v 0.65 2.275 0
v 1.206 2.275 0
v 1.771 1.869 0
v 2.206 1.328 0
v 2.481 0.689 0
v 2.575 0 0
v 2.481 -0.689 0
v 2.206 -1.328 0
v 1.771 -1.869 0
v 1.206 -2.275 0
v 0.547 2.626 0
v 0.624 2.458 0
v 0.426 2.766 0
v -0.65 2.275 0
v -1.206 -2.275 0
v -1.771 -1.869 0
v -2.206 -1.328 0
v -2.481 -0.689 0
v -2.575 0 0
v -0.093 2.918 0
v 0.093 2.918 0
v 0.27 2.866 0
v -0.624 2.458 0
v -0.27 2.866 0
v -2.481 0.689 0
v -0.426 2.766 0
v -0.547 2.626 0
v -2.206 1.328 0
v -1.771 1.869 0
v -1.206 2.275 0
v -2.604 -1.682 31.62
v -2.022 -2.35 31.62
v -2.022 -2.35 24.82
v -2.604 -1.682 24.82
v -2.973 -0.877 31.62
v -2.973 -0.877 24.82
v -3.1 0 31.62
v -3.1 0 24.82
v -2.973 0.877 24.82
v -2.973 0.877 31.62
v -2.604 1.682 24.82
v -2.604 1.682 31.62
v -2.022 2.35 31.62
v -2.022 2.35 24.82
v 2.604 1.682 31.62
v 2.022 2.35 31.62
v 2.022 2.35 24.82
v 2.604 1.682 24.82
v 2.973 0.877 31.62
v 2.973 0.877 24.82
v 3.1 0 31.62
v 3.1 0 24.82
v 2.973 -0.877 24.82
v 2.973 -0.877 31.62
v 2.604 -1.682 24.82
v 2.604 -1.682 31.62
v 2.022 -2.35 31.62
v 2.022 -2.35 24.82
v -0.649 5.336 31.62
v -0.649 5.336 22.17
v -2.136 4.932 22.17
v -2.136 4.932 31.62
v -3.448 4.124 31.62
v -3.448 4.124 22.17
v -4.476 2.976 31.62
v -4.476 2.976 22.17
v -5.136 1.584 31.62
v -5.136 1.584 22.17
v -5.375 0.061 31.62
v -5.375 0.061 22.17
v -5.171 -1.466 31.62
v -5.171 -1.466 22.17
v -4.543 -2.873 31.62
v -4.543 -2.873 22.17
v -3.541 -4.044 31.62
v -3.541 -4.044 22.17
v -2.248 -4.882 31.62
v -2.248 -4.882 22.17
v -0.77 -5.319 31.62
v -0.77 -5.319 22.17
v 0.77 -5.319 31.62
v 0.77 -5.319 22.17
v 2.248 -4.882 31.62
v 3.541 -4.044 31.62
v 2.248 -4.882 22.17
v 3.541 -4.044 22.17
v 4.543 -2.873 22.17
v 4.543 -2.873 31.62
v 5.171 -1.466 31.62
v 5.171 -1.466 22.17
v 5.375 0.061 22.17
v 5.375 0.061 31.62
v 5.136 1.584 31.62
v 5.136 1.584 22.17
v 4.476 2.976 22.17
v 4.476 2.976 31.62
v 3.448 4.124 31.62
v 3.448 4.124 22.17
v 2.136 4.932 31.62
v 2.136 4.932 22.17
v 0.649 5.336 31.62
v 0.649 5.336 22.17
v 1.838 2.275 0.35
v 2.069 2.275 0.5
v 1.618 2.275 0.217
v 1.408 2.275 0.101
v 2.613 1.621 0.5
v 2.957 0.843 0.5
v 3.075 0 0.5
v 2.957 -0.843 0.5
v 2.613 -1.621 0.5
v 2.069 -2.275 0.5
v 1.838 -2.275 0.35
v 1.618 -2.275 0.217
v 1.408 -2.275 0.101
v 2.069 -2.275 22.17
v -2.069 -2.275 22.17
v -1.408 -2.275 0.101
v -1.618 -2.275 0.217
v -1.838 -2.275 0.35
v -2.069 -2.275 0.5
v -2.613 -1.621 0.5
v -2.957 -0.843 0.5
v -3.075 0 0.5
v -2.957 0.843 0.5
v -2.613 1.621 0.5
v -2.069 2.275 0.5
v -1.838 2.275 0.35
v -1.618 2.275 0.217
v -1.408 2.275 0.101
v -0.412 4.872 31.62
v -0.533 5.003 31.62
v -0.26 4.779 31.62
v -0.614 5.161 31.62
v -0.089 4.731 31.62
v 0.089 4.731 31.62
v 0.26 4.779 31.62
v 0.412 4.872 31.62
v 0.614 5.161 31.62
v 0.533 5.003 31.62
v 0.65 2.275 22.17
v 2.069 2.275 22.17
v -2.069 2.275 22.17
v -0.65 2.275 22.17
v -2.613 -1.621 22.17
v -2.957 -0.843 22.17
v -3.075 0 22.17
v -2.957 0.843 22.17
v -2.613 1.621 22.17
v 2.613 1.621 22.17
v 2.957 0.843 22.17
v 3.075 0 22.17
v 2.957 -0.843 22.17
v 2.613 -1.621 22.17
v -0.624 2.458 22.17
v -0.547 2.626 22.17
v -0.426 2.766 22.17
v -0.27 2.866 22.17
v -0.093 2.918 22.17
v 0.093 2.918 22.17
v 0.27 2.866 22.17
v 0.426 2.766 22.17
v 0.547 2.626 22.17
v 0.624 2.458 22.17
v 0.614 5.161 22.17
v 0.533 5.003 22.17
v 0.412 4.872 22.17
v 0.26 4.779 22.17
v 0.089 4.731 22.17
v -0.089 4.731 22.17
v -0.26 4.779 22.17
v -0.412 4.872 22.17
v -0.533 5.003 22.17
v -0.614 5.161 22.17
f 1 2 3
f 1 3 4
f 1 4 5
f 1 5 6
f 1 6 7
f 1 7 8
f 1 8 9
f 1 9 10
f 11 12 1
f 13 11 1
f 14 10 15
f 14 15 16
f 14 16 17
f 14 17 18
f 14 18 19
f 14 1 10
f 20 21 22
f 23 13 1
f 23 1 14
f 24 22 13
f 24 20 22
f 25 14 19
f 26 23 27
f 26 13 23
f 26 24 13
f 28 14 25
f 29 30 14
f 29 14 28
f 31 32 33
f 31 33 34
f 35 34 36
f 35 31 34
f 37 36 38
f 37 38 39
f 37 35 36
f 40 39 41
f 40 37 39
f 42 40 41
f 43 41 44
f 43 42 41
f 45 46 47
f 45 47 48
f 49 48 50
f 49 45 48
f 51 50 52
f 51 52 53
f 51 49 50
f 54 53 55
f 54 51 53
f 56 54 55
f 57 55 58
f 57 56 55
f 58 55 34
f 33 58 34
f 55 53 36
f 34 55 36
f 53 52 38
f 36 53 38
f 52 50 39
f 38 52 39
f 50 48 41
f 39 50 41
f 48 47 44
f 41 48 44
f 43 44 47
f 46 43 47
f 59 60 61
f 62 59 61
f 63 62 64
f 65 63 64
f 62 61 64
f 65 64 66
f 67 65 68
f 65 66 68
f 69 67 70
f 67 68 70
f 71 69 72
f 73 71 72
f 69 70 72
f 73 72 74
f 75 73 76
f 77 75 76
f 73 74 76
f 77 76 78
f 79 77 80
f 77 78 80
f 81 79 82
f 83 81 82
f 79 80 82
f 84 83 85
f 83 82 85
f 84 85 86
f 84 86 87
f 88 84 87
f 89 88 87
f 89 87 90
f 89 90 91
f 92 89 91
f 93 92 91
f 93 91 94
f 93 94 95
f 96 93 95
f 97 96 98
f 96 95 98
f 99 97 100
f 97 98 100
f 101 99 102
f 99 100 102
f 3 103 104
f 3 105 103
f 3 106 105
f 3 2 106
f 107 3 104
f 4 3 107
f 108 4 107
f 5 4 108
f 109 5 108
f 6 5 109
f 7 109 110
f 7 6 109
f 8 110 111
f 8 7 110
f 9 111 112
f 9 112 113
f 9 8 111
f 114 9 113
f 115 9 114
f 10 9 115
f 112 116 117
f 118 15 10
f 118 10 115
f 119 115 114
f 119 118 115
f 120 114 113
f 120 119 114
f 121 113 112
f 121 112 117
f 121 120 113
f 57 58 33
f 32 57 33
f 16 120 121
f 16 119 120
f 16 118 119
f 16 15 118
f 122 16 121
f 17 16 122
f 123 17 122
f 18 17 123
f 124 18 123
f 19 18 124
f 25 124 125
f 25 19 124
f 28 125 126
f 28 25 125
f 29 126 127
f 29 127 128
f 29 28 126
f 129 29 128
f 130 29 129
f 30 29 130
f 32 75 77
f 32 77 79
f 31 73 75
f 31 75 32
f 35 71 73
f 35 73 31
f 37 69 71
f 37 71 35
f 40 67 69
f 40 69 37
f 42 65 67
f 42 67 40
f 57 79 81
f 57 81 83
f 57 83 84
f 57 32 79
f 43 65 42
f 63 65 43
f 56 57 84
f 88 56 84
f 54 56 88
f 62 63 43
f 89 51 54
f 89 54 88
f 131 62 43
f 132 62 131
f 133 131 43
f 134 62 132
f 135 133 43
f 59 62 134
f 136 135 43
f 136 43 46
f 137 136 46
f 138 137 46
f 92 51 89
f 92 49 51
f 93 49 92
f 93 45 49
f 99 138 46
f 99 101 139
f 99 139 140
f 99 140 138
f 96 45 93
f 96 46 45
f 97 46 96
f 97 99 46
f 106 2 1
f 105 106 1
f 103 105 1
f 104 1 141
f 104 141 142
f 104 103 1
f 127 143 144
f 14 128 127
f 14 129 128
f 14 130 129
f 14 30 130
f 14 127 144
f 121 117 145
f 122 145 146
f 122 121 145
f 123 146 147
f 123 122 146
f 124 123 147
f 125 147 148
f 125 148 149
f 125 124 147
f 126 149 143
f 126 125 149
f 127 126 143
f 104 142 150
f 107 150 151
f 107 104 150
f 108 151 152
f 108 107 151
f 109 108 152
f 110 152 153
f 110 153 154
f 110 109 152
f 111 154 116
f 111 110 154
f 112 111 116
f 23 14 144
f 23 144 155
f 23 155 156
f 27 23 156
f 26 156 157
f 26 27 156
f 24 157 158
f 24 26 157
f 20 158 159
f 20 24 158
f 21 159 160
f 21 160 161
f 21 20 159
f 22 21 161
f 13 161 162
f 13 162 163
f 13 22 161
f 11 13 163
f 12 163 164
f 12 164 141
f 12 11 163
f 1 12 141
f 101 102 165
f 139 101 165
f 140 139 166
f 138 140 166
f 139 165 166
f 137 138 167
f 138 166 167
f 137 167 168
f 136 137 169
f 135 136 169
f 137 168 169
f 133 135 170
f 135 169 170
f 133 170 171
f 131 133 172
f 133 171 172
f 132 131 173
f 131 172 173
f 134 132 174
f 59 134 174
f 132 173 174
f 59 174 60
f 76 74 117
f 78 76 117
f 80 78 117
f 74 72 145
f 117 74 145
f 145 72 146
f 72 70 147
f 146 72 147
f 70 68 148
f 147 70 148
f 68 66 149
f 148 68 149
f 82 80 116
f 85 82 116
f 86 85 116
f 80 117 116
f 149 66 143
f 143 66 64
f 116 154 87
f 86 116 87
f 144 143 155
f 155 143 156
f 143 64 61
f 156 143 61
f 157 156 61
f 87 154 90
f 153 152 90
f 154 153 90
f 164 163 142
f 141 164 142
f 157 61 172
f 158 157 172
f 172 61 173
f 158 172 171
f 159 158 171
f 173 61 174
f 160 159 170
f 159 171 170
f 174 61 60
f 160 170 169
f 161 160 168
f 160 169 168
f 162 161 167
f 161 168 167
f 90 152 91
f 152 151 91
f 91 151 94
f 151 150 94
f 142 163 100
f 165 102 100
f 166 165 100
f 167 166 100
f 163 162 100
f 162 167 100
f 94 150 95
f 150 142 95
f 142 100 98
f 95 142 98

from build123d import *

# Parameters (mm, degrees)
BOSS_EXTRUDE1_DEPTH = 22.17
BOSS_EXTRUDE2_DEPTH = 9.45
CUT_EXTRUDE1_DEPTH  = 6.8
CHAMFER1_SIZE       = 0.5


with BuildPart() as part:
    # Sketch1 → Boss-Extrude1 (new body)
    with BuildSketch(Plane.XY):
        with BuildLine():
            Line((0.65, 2.275), (2.068816087, 2.275))
            ThreePointArc((2.068816087, 2.275), (3.075, 0), (2.068816087, -2.275))
            Line((2.068816087, -2.275), (-2.068816087, -2.275))
            ThreePointArc((-2.068816087, -2.275), (-3.075, 0), (-2.068816087, 2.275))
            Line((-2.068816087, 2.275), (-0.65, 2.275))
            ThreePointArc((-0.65, 2.275), (0, 2.925), (0.65, 2.275))
        make_face()
    extrude(amount=BOSS_EXTRUDE1_DEPTH)

    # Sketch2 → Boss-Extrude2 (add)
    with BuildSketch(Plane.XY.offset(22.17)):
        with BuildLine():
            ThreePointArc((-0.648810702, 5.335697674), (0, -5.375), (0.648810702, 5.335697674))
            ThreePointArc((0.648810702, 5.335697674), (0, 4.725), (-0.648810702, 5.335697674))
        make_face()
    extrude(amount=BOSS_EXTRUDE2_DEPTH)

    # Sketch3 → Cut-Extrude1 (cut)
    with BuildSketch(Plane.XY.offset(31.62)):
        with BuildLine():
            Line((-2.021756662, 2.35), (2.021756662, 2.35))
            ThreePointArc((2.021756662, 2.35), (3.1, 0), (2.021756662, -2.35))
            Line((2.021756662, -2.35), (-2.021756662, -2.35))
            ThreePointArc((-2.021756662, -2.35), (-3.1, 0), (-2.021756662, 2.35))
        make_face()
    extrude(amount=-CUT_EXTRUDE1_DEPTH, mode=Mode.SUBTRACT)

    # Chamfer1
    chamfer1_edges = [part.edges().sort_by_distance(p)[0] for p in [
        (3.075, 0, 0),
        (-3.075, 0, 0),
    ]]
    chamfer(chamfer1_edges, length=CHAMFER1_SIZE)


solid = part.part
